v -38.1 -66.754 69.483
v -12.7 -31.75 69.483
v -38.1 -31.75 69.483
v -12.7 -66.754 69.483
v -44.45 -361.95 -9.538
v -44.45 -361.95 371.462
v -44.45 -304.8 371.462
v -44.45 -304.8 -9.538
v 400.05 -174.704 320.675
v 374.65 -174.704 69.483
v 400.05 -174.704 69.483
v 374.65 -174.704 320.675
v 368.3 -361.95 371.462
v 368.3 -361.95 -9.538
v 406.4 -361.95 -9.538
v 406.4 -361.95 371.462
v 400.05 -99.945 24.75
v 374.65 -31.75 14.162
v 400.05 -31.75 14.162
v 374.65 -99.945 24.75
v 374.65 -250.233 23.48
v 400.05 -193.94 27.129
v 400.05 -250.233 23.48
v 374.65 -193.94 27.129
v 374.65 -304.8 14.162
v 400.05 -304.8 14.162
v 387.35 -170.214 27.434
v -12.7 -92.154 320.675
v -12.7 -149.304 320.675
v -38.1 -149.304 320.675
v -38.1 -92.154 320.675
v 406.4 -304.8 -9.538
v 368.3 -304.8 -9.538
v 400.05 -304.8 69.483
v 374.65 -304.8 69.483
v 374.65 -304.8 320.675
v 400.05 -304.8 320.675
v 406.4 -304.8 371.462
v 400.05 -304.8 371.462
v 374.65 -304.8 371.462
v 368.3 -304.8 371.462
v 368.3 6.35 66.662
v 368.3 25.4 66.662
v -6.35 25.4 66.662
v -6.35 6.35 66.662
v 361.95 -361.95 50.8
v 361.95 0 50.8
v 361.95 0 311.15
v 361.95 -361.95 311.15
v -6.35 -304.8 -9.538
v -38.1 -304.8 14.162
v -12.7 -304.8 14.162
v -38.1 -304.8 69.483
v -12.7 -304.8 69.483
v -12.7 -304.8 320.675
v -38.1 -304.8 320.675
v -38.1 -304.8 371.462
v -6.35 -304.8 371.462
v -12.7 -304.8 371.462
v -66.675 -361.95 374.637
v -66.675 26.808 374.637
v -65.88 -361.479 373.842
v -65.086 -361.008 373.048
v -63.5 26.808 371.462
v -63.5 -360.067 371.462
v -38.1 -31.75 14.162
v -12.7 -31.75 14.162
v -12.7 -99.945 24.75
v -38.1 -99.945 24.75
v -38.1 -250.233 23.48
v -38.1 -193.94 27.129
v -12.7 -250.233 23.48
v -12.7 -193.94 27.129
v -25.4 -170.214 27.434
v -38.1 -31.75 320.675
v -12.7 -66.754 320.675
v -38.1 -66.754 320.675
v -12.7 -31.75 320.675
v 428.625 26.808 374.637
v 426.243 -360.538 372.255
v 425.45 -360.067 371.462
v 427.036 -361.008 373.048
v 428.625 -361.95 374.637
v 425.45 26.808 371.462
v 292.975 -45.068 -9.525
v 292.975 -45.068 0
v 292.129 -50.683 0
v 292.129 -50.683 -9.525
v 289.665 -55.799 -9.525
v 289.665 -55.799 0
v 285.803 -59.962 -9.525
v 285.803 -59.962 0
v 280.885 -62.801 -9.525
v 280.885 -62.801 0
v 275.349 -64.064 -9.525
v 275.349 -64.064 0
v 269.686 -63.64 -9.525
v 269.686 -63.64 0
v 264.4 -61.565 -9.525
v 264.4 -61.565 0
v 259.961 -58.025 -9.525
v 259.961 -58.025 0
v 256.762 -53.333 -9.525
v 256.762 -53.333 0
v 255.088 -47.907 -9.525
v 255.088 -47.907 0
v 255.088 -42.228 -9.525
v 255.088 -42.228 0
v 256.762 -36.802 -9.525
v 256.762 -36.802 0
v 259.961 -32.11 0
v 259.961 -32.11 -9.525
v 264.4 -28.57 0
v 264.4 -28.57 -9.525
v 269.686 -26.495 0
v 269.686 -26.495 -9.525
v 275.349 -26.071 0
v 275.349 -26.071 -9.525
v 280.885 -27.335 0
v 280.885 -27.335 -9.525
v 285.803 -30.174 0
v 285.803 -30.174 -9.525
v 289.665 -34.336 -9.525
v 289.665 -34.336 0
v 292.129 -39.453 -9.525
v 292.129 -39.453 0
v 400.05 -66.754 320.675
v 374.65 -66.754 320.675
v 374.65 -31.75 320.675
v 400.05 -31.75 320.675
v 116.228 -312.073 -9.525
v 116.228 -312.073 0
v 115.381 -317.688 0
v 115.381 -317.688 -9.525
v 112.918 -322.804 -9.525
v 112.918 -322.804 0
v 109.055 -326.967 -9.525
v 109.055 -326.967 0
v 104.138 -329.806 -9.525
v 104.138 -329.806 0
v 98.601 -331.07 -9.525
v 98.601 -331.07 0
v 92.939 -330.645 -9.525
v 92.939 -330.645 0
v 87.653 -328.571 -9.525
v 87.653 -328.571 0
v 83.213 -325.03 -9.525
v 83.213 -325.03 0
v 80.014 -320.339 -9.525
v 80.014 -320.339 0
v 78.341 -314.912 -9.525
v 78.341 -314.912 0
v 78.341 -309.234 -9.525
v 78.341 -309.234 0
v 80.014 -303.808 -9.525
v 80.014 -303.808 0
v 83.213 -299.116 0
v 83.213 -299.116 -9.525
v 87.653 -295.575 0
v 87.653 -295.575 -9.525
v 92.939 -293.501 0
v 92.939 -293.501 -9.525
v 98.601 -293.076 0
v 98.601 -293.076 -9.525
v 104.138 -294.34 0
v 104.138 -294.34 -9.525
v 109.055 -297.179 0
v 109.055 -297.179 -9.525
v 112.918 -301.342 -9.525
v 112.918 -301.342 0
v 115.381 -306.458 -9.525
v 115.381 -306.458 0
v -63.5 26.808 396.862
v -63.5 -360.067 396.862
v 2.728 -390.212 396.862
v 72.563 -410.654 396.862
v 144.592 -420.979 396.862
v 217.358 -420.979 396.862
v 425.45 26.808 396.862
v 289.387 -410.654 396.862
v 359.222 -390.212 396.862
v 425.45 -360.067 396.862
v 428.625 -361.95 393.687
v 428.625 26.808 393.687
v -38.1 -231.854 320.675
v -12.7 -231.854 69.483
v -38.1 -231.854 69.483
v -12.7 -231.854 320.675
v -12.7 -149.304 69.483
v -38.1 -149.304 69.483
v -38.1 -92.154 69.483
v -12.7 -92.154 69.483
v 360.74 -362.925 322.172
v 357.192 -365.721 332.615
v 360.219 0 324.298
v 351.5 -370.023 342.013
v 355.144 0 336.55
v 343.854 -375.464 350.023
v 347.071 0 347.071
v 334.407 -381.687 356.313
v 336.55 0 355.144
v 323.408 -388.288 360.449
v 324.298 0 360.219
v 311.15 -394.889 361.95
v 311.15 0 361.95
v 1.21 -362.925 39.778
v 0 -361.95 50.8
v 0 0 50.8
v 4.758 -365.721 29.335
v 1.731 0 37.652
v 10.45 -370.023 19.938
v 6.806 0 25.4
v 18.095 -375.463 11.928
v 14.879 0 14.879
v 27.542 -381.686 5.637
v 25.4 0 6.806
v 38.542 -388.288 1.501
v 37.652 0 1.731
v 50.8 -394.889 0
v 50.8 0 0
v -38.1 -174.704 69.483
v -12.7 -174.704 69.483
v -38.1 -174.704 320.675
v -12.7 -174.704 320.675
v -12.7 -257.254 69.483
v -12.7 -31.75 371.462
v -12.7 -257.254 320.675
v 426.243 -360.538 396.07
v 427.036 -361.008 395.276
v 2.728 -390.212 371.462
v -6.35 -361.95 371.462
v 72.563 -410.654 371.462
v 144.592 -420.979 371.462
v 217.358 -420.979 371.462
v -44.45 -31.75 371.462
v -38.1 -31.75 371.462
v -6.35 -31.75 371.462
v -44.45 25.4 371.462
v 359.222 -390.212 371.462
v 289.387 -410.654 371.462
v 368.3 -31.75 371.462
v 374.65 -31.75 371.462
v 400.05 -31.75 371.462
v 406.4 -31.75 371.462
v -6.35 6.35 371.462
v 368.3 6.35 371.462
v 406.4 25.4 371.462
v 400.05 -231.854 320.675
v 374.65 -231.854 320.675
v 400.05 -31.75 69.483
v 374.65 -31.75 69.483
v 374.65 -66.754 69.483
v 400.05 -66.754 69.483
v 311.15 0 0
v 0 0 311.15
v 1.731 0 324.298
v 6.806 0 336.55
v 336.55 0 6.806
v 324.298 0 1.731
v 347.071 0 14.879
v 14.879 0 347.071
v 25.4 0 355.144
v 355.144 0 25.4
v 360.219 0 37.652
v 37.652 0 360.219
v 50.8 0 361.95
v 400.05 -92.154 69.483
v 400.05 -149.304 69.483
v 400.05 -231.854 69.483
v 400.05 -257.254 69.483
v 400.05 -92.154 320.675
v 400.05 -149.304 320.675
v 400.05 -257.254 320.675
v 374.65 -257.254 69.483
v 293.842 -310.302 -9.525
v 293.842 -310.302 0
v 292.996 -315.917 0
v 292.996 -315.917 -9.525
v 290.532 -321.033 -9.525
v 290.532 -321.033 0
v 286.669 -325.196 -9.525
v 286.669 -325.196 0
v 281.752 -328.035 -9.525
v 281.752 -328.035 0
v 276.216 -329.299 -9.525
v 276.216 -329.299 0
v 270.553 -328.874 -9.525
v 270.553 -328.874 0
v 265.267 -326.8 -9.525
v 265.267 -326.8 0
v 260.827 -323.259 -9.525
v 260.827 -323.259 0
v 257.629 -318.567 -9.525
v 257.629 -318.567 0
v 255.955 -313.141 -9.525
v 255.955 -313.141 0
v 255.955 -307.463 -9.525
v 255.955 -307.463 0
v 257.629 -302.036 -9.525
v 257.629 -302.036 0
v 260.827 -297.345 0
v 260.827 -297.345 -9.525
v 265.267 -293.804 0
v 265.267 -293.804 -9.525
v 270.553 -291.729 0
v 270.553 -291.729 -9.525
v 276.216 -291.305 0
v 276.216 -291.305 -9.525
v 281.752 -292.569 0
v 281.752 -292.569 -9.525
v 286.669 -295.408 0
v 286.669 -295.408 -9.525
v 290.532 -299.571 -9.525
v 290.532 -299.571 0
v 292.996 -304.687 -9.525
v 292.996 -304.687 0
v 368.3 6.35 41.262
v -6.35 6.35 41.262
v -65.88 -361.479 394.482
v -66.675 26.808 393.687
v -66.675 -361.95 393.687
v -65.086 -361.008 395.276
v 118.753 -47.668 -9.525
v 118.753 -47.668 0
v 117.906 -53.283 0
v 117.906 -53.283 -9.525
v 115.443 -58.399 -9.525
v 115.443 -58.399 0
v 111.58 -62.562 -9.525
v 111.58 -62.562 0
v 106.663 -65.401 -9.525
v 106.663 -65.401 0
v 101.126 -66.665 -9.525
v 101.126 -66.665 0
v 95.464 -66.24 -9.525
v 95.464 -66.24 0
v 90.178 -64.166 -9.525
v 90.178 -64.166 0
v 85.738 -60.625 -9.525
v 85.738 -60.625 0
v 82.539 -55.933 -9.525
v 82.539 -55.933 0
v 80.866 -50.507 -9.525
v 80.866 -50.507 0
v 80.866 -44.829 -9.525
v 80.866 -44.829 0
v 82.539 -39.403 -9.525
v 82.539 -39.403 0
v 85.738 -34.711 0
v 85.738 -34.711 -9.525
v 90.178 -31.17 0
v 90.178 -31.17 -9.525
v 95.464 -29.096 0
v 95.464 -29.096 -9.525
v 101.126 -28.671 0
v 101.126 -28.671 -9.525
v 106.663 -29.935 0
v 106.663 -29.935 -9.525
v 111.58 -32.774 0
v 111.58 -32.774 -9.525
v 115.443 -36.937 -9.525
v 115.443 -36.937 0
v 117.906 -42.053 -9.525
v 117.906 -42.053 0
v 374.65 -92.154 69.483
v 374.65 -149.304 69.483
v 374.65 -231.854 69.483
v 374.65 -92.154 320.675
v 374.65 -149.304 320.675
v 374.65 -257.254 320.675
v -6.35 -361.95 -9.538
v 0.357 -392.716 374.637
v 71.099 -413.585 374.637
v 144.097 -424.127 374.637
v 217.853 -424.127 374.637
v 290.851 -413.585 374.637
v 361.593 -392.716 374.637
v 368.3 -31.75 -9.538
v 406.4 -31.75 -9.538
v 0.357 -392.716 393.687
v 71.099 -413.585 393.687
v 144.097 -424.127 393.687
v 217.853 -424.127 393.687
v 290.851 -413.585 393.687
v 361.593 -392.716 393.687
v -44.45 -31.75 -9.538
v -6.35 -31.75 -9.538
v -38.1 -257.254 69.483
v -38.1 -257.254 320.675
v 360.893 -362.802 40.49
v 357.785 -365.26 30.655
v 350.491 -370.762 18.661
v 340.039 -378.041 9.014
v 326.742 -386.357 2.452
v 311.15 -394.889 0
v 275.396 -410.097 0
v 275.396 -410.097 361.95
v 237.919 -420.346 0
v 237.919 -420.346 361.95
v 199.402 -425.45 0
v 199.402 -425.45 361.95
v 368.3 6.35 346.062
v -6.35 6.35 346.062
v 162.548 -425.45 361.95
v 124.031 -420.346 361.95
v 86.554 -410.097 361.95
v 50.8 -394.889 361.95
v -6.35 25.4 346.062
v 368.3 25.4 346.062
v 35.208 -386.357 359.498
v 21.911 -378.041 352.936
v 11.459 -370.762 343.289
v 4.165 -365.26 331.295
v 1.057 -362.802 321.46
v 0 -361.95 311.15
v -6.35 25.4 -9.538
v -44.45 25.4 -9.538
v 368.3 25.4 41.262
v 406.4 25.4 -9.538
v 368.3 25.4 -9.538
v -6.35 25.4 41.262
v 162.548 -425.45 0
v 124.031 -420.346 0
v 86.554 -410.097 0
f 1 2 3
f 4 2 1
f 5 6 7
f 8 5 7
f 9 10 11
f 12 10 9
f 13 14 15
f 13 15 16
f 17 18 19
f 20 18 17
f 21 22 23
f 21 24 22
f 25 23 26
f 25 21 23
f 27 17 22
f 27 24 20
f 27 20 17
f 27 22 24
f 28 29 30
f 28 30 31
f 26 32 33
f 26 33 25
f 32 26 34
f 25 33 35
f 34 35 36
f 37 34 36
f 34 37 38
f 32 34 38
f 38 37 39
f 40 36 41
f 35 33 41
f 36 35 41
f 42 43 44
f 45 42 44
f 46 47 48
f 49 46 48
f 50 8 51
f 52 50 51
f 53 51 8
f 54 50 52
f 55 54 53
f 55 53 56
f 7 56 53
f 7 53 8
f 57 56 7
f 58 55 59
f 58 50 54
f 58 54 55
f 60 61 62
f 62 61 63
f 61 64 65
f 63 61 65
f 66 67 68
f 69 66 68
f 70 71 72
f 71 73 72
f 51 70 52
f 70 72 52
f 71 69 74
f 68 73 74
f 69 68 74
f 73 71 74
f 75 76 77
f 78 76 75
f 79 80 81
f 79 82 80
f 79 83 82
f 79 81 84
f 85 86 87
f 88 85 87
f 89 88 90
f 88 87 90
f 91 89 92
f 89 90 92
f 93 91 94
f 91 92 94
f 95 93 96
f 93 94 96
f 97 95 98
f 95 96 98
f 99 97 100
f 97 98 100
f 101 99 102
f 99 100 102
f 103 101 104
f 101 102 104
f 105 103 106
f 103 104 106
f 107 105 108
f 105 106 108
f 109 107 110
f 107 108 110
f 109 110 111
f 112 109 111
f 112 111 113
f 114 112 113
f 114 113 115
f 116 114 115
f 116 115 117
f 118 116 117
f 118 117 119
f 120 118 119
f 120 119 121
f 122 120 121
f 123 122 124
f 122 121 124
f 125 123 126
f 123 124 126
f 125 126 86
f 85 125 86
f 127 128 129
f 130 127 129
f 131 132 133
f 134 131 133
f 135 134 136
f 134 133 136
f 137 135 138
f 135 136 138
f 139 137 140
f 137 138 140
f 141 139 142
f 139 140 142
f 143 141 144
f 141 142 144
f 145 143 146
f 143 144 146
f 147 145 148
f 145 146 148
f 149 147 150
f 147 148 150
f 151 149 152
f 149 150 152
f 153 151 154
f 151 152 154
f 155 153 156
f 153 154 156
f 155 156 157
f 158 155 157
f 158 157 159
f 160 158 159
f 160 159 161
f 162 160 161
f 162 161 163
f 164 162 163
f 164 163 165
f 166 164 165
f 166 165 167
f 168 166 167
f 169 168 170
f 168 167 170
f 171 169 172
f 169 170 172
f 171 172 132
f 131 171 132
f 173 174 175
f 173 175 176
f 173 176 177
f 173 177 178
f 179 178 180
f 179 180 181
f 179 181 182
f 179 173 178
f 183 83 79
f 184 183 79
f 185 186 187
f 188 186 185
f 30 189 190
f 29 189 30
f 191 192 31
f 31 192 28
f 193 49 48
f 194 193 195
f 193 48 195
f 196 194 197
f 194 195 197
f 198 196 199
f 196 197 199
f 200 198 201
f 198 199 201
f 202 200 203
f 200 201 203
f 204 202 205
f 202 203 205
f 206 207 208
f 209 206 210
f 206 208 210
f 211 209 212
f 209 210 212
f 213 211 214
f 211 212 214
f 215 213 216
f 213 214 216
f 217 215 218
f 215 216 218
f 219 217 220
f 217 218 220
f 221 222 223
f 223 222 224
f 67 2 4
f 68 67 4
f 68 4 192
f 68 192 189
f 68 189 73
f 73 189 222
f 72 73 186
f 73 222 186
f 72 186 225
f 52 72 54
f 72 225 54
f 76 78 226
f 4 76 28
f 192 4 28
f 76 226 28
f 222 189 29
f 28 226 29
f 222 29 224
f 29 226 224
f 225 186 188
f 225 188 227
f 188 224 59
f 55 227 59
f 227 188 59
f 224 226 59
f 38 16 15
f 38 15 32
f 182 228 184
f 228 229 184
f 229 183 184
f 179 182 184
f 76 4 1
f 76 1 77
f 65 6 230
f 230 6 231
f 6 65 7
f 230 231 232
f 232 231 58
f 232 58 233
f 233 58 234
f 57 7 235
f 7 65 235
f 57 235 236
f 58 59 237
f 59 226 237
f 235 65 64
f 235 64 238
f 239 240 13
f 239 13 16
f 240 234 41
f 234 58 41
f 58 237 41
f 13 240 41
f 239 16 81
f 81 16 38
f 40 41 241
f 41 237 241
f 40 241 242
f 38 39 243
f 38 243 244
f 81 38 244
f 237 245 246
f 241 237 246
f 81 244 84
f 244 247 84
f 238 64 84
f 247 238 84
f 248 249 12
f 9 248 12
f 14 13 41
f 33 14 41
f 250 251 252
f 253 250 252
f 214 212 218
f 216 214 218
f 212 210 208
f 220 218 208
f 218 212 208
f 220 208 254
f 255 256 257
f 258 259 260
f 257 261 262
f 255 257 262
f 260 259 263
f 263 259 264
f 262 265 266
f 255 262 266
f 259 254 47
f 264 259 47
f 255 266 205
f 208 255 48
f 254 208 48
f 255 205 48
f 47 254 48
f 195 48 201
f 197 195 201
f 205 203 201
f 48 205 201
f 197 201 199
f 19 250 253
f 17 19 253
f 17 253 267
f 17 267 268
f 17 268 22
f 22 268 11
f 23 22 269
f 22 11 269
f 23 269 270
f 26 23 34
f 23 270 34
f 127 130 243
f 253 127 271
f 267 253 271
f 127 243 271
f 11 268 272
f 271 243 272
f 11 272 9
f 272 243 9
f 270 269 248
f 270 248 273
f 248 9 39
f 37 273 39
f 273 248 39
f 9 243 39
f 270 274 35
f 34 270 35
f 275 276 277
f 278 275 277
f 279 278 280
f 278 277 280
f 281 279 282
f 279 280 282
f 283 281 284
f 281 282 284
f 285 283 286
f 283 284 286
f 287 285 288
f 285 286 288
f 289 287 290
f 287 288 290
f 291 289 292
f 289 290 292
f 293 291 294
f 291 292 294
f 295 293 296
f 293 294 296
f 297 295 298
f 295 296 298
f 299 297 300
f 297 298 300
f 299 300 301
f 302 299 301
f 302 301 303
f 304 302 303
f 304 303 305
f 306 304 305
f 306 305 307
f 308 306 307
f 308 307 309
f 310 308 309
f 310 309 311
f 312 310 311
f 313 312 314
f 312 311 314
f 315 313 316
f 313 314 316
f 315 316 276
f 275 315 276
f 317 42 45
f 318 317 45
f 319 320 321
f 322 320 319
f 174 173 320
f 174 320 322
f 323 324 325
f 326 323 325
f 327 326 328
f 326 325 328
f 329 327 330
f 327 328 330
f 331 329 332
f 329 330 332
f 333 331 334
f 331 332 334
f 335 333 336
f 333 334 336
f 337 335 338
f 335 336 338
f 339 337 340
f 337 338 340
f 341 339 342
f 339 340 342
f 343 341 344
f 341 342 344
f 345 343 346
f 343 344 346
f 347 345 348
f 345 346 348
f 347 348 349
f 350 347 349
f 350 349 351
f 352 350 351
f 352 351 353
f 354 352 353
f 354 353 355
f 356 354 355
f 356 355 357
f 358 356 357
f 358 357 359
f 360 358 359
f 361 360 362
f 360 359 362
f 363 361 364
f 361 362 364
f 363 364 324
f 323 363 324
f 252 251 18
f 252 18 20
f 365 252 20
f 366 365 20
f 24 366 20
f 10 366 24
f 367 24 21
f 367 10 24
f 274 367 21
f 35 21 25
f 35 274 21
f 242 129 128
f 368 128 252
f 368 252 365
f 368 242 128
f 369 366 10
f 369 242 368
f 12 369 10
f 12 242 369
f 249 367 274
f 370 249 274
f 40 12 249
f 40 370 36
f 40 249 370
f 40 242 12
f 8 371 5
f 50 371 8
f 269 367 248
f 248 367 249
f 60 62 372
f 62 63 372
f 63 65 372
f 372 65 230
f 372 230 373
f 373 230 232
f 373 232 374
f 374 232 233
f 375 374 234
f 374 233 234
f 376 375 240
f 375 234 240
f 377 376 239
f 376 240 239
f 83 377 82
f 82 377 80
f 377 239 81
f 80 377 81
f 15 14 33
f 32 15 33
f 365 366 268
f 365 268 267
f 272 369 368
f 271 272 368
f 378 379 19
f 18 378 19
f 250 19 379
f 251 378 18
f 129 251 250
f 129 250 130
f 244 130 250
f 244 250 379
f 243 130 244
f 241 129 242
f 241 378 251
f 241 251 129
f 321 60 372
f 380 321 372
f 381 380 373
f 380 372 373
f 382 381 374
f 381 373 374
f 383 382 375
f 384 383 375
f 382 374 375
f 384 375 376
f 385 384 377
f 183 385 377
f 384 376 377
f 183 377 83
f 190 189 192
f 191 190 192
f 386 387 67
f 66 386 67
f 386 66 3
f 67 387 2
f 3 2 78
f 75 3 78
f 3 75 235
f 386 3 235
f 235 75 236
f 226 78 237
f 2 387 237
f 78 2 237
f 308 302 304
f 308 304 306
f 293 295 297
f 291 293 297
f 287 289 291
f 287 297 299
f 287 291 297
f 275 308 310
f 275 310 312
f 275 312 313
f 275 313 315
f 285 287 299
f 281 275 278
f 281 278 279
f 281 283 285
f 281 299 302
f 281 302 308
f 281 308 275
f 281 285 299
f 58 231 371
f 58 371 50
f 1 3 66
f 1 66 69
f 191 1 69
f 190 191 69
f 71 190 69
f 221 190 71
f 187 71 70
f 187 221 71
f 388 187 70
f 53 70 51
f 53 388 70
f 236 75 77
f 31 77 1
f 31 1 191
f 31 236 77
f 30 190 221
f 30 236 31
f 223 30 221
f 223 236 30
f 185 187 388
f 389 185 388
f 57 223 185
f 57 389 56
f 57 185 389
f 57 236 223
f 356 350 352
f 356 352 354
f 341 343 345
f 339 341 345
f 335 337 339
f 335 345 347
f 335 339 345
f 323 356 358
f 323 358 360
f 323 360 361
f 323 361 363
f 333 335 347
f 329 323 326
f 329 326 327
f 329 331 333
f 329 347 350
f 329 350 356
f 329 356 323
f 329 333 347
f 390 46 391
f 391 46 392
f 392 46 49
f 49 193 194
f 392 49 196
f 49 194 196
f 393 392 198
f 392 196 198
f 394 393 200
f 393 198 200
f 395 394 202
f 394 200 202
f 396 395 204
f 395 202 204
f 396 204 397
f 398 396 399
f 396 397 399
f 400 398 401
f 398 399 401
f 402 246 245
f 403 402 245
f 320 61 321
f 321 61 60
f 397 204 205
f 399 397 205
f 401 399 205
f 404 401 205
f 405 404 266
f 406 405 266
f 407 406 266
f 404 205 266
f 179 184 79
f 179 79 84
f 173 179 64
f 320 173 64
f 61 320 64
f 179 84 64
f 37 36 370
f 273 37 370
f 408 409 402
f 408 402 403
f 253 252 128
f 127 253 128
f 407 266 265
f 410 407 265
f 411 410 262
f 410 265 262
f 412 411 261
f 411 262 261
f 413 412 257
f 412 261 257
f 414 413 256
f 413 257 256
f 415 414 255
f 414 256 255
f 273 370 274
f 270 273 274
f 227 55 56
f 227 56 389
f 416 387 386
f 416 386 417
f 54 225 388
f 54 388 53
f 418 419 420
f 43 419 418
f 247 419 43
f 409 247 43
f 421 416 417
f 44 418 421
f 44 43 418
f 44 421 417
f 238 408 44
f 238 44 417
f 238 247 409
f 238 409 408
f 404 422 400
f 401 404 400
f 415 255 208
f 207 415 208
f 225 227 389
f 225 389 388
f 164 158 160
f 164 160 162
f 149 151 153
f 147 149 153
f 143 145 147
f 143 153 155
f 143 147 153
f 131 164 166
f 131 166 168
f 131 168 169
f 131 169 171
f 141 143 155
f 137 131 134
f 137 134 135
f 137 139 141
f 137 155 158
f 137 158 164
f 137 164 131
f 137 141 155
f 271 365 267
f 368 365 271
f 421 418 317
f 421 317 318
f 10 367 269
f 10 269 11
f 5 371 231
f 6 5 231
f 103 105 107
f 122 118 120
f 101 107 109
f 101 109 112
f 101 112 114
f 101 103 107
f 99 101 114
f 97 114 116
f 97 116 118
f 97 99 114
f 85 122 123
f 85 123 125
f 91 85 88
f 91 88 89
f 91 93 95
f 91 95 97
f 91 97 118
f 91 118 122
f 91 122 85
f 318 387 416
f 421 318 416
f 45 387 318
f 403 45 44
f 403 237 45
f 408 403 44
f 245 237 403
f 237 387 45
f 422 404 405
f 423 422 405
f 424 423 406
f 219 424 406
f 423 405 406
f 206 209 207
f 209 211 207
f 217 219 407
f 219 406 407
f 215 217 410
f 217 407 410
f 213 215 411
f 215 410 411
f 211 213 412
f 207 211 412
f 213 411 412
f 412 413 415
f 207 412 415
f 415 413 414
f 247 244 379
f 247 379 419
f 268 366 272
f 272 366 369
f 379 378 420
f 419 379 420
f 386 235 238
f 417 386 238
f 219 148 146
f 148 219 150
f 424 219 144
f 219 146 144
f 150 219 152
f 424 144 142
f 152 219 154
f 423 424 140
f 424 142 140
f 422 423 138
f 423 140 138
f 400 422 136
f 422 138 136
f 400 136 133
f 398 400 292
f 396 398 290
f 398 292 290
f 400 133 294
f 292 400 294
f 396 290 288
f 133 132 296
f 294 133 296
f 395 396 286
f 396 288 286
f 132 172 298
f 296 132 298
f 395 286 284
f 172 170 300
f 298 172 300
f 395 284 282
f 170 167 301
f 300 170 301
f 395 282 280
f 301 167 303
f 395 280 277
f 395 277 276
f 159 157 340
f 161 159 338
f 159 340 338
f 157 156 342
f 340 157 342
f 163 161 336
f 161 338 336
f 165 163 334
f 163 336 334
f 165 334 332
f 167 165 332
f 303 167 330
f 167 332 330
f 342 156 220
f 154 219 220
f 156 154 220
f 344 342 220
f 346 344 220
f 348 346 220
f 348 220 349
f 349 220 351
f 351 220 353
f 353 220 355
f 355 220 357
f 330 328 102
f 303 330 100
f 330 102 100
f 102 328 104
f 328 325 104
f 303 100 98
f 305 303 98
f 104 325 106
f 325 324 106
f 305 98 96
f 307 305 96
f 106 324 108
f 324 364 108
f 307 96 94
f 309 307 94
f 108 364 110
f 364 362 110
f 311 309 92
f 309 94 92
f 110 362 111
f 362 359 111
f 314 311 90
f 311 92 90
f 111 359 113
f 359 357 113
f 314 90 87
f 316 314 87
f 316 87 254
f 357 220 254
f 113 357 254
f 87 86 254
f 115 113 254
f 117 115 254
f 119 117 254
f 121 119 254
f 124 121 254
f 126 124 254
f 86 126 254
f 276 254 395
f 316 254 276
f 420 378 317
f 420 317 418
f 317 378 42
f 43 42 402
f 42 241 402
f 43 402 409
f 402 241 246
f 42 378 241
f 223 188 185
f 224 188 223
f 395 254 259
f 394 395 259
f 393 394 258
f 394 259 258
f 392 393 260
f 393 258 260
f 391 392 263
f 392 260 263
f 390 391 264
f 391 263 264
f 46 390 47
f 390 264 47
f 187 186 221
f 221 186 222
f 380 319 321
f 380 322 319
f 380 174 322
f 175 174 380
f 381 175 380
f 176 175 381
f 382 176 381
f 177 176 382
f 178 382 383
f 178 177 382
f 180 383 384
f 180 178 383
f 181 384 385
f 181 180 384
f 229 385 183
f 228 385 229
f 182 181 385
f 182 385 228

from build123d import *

# Parameters (mm, degrees)
F4_DEPTH  = 425.45
F5_R      = 19.05
F6_DEPTH  = 9.525
F8_DEPTH  = 361.95
F9_W      = 57.15
F9_H      = 381.0128062427
F10_DEPTH = 38.1
F9_H_2    = 381
F11_W     = 57.15
F11_H     = 251.1923307657
F12_DEPTH = 25.4
F16_DEPTH = 25.4
F17_SIZE  = 3.175
F18_W     = 374.65
F18_H     = 25.4
F19_DEPTH = 19.05


# Not quite as in the source:
# - a feature names something its author has since deleted; it is built from what else it names


with BuildPart() as f4:
    # F3 (on Front) → F4 (new body)
    with BuildSketch(Plane.XZ):
        with BuildLine():
            ThreePointArc((0, 50.8), (14.8789755157, 14.8789755157), (50.8, 0))
            Line((50.8, 0), (311.15, 0))
            ThreePointArc((311.15, 0), (347.0710244843, 14.8789755157), (361.95, 50.8))
            Line((361.95, 50.8), (361.95, 311.15))
            ThreePointArc((361.95, 311.15), (347.0710244843, 347.0710244843), (311.15, 361.95))
            Line((311.15, 361.95), (50.8, 361.95))
            ThreePointArc((50.8, 361.95), (14.8789755157, 347.0710244843), (0, 311.15))
            Line((0, 311.15), (0, 50.8))
        make_face()
    extrude(amount=F4_DEPTH)

    # F5 (on face) → F6 (join)
    with BuildSketch(Plane(origin=(0, 0, 0), x_dir=(1, 0, 0), z_dir=(0, 0, -1))):
        with Locations((97.1778258681, 312.0730817318)):
            Circle(F5_R)
        with Locations((274.7920155525, 310.3018701077)):
            Circle(F5_R)
        with Locations((273.9252448082, 45.0676828623)):
            Circle(F5_R)
        with Locations((99.7027978301, 47.6680137217)):
            Circle(F5_R)
    extrude(amount=F6_DEPTH)

    # F7 (on face) → F8 (cut)
    with BuildSketch(Plane.XY.offset(361.95)):
        with BuildLine():
            Line((0, -361.95), (0, -425.45))
            Line((0, -425.45), (0, -444.5584714413))
            Line((0, -444.5584714413), (361.95, -444.5584714413))
            Line((361.95, -444.5584714413), (361.95, -425.45))
            Line((361.95, -425.45), (361.95, -361.95))
            ThreePointArc((361.95, -361.95), (180.975, -426.0410288054), (0, -361.95))
        make_face()
    extrude(amount=-F8_DEPTH, mode=Mode.SUBTRACT)


with BuildPart() as f10:
    # F9 (on offset) → F10 (new body)
    with BuildSketch(Plane.YZ.offset(-6.35)):
        with Locations((-3.175, 180.9685968786)):
            Rectangle(F9_W, F9_H)
    extrude(amount=-F10_DEPTH)



with BuildPart() as f10b:
    # F9 (on offset) → F10, piece 2 (new body)
    with BuildSketch(Plane.YZ.offset(-6.35)):
        with Locations((-333.375, 180.9621937573)):
            Rectangle(F9_W, F9_H_2)
    extrude(amount=-F10_DEPTH)


with BuildPart() as f10_1:
    add(f10.part)

    add(f10b.part)  # F12 merges F10b
    # F11 (on offset) → F12 (join)
    with BuildSketch(Plane.YZ.offset(-12.7)):
        with BuildLine():
            add(Edge.make_bspline(
                [(-31.75, 14.161660336), (-75.4469480959, 24.607324823), (-170.5375424164, 30.3344869468), (-261.7136147626, 24.4613710426), (-304.8, 14.161660336)],
                knots=[0, 0, 0, 0, 0.5035177426, 1, 1, 1, 1], degree=3))
            Line((-31.75, 14.161660336), (-31.75, 69.4826692343))
            Line((-31.75, 69.4826692343), (-66.7540449142, 69.4826692343))
            Line((-66.7540449142, 69.4826692343), (-66.7540449142, 320.675))
            Line((-66.7540449142, 320.675), (-31.75, 320.675))
            Line((-31.75, 320.675), (-31.75, 371.475))
            Line((-31.75, 371.475), (-304.8, 371.475))
            Line((-304.8, 371.475), (-304.8, 371.4621937573))
            Line((-304.8, 371.4621937573), (-304.8, 320.675))
            Line((-304.8, 320.675), (-257.2540449142, 320.675))
            Line((-257.2540449142, 320.675), (-257.2540449142, 69.4826692343))
            Line((-257.2540449142, 69.4826692343), (-304.8, 69.4826692343))
            Line((-304.8, 69.4826692343), (-304.8, 14.161660336))
        make_face()
        with Locations((-203.2790449142, 195.0788346171)):
            Rectangle(F11_W, F11_H, mode=Mode.SUBTRACT)
        with Locations((-120.7290449142, 195.0788346171)):
            Rectangle(F11_W, F11_H, mode=Mode.SUBTRACT)
    extrude(amount=-F12_DEPTH)


with BuildPart() as f13_1:
    # F13: instance of F10
    add(f10_1.part.mirror(Plane.YZ.offset(180.975)))


with BuildPart() as f10_2:
    add(f10_1.part)

    add(f13_1.part)  # F16 merges F13_1
    # F15 (on offset) → F16 (join)
    with BuildSketch(Plane.XY.offset(371.4621937573)):
        with BuildLine():
            Line((-66.675, 26.8077049404), (-66.675, 0))
            Line((-66.675, 0), (-66.675, -361.95))
            ThreePointArc((-66.675, -361.95), (180.975, -425.45), (428.625, -361.95))
            Line((428.625, -361.95), (428.625, 0))
            Line((428.625, 0), (428.625, 26.8077049404))
            Line((428.625, 26.8077049404), (-66.675, 26.8077049404))
        make_face()
    extrude(amount=F16_DEPTH)

    # F17
    f17_edges = [f10_2.edges().sort_by_distance(p)[0] for p in [
        (428.625, -167.571148, 396.862194),
        (180.975, -425.45, 396.862194),
        (-66.675, -167.571148, 396.862194),
        (428.625, -167.571148, 371.462194),
        (180.975, -425.45, 371.462194),
        (-66.675, -167.571148, 371.462194),
    ]]
    chamfer(f17_edges, length=F17_SIZE)

    # F18 (on face) → F19 (join)
    with BuildSketch(Plane(origin=(0, 25.4, 0), x_dir=(-1, 0, 0), z_dir=(0, 1, 0))):
        with Locations((-180.975, 358.7621937573)):
            Rectangle(F18_W, F18_H)
        with Locations((-180.975, 53.9621937573)):
            Rectangle(F18_W, F18_H)
    extrude(amount=-F19_DEPTH)


solid = Compound([f4.part, f10_2.part])
